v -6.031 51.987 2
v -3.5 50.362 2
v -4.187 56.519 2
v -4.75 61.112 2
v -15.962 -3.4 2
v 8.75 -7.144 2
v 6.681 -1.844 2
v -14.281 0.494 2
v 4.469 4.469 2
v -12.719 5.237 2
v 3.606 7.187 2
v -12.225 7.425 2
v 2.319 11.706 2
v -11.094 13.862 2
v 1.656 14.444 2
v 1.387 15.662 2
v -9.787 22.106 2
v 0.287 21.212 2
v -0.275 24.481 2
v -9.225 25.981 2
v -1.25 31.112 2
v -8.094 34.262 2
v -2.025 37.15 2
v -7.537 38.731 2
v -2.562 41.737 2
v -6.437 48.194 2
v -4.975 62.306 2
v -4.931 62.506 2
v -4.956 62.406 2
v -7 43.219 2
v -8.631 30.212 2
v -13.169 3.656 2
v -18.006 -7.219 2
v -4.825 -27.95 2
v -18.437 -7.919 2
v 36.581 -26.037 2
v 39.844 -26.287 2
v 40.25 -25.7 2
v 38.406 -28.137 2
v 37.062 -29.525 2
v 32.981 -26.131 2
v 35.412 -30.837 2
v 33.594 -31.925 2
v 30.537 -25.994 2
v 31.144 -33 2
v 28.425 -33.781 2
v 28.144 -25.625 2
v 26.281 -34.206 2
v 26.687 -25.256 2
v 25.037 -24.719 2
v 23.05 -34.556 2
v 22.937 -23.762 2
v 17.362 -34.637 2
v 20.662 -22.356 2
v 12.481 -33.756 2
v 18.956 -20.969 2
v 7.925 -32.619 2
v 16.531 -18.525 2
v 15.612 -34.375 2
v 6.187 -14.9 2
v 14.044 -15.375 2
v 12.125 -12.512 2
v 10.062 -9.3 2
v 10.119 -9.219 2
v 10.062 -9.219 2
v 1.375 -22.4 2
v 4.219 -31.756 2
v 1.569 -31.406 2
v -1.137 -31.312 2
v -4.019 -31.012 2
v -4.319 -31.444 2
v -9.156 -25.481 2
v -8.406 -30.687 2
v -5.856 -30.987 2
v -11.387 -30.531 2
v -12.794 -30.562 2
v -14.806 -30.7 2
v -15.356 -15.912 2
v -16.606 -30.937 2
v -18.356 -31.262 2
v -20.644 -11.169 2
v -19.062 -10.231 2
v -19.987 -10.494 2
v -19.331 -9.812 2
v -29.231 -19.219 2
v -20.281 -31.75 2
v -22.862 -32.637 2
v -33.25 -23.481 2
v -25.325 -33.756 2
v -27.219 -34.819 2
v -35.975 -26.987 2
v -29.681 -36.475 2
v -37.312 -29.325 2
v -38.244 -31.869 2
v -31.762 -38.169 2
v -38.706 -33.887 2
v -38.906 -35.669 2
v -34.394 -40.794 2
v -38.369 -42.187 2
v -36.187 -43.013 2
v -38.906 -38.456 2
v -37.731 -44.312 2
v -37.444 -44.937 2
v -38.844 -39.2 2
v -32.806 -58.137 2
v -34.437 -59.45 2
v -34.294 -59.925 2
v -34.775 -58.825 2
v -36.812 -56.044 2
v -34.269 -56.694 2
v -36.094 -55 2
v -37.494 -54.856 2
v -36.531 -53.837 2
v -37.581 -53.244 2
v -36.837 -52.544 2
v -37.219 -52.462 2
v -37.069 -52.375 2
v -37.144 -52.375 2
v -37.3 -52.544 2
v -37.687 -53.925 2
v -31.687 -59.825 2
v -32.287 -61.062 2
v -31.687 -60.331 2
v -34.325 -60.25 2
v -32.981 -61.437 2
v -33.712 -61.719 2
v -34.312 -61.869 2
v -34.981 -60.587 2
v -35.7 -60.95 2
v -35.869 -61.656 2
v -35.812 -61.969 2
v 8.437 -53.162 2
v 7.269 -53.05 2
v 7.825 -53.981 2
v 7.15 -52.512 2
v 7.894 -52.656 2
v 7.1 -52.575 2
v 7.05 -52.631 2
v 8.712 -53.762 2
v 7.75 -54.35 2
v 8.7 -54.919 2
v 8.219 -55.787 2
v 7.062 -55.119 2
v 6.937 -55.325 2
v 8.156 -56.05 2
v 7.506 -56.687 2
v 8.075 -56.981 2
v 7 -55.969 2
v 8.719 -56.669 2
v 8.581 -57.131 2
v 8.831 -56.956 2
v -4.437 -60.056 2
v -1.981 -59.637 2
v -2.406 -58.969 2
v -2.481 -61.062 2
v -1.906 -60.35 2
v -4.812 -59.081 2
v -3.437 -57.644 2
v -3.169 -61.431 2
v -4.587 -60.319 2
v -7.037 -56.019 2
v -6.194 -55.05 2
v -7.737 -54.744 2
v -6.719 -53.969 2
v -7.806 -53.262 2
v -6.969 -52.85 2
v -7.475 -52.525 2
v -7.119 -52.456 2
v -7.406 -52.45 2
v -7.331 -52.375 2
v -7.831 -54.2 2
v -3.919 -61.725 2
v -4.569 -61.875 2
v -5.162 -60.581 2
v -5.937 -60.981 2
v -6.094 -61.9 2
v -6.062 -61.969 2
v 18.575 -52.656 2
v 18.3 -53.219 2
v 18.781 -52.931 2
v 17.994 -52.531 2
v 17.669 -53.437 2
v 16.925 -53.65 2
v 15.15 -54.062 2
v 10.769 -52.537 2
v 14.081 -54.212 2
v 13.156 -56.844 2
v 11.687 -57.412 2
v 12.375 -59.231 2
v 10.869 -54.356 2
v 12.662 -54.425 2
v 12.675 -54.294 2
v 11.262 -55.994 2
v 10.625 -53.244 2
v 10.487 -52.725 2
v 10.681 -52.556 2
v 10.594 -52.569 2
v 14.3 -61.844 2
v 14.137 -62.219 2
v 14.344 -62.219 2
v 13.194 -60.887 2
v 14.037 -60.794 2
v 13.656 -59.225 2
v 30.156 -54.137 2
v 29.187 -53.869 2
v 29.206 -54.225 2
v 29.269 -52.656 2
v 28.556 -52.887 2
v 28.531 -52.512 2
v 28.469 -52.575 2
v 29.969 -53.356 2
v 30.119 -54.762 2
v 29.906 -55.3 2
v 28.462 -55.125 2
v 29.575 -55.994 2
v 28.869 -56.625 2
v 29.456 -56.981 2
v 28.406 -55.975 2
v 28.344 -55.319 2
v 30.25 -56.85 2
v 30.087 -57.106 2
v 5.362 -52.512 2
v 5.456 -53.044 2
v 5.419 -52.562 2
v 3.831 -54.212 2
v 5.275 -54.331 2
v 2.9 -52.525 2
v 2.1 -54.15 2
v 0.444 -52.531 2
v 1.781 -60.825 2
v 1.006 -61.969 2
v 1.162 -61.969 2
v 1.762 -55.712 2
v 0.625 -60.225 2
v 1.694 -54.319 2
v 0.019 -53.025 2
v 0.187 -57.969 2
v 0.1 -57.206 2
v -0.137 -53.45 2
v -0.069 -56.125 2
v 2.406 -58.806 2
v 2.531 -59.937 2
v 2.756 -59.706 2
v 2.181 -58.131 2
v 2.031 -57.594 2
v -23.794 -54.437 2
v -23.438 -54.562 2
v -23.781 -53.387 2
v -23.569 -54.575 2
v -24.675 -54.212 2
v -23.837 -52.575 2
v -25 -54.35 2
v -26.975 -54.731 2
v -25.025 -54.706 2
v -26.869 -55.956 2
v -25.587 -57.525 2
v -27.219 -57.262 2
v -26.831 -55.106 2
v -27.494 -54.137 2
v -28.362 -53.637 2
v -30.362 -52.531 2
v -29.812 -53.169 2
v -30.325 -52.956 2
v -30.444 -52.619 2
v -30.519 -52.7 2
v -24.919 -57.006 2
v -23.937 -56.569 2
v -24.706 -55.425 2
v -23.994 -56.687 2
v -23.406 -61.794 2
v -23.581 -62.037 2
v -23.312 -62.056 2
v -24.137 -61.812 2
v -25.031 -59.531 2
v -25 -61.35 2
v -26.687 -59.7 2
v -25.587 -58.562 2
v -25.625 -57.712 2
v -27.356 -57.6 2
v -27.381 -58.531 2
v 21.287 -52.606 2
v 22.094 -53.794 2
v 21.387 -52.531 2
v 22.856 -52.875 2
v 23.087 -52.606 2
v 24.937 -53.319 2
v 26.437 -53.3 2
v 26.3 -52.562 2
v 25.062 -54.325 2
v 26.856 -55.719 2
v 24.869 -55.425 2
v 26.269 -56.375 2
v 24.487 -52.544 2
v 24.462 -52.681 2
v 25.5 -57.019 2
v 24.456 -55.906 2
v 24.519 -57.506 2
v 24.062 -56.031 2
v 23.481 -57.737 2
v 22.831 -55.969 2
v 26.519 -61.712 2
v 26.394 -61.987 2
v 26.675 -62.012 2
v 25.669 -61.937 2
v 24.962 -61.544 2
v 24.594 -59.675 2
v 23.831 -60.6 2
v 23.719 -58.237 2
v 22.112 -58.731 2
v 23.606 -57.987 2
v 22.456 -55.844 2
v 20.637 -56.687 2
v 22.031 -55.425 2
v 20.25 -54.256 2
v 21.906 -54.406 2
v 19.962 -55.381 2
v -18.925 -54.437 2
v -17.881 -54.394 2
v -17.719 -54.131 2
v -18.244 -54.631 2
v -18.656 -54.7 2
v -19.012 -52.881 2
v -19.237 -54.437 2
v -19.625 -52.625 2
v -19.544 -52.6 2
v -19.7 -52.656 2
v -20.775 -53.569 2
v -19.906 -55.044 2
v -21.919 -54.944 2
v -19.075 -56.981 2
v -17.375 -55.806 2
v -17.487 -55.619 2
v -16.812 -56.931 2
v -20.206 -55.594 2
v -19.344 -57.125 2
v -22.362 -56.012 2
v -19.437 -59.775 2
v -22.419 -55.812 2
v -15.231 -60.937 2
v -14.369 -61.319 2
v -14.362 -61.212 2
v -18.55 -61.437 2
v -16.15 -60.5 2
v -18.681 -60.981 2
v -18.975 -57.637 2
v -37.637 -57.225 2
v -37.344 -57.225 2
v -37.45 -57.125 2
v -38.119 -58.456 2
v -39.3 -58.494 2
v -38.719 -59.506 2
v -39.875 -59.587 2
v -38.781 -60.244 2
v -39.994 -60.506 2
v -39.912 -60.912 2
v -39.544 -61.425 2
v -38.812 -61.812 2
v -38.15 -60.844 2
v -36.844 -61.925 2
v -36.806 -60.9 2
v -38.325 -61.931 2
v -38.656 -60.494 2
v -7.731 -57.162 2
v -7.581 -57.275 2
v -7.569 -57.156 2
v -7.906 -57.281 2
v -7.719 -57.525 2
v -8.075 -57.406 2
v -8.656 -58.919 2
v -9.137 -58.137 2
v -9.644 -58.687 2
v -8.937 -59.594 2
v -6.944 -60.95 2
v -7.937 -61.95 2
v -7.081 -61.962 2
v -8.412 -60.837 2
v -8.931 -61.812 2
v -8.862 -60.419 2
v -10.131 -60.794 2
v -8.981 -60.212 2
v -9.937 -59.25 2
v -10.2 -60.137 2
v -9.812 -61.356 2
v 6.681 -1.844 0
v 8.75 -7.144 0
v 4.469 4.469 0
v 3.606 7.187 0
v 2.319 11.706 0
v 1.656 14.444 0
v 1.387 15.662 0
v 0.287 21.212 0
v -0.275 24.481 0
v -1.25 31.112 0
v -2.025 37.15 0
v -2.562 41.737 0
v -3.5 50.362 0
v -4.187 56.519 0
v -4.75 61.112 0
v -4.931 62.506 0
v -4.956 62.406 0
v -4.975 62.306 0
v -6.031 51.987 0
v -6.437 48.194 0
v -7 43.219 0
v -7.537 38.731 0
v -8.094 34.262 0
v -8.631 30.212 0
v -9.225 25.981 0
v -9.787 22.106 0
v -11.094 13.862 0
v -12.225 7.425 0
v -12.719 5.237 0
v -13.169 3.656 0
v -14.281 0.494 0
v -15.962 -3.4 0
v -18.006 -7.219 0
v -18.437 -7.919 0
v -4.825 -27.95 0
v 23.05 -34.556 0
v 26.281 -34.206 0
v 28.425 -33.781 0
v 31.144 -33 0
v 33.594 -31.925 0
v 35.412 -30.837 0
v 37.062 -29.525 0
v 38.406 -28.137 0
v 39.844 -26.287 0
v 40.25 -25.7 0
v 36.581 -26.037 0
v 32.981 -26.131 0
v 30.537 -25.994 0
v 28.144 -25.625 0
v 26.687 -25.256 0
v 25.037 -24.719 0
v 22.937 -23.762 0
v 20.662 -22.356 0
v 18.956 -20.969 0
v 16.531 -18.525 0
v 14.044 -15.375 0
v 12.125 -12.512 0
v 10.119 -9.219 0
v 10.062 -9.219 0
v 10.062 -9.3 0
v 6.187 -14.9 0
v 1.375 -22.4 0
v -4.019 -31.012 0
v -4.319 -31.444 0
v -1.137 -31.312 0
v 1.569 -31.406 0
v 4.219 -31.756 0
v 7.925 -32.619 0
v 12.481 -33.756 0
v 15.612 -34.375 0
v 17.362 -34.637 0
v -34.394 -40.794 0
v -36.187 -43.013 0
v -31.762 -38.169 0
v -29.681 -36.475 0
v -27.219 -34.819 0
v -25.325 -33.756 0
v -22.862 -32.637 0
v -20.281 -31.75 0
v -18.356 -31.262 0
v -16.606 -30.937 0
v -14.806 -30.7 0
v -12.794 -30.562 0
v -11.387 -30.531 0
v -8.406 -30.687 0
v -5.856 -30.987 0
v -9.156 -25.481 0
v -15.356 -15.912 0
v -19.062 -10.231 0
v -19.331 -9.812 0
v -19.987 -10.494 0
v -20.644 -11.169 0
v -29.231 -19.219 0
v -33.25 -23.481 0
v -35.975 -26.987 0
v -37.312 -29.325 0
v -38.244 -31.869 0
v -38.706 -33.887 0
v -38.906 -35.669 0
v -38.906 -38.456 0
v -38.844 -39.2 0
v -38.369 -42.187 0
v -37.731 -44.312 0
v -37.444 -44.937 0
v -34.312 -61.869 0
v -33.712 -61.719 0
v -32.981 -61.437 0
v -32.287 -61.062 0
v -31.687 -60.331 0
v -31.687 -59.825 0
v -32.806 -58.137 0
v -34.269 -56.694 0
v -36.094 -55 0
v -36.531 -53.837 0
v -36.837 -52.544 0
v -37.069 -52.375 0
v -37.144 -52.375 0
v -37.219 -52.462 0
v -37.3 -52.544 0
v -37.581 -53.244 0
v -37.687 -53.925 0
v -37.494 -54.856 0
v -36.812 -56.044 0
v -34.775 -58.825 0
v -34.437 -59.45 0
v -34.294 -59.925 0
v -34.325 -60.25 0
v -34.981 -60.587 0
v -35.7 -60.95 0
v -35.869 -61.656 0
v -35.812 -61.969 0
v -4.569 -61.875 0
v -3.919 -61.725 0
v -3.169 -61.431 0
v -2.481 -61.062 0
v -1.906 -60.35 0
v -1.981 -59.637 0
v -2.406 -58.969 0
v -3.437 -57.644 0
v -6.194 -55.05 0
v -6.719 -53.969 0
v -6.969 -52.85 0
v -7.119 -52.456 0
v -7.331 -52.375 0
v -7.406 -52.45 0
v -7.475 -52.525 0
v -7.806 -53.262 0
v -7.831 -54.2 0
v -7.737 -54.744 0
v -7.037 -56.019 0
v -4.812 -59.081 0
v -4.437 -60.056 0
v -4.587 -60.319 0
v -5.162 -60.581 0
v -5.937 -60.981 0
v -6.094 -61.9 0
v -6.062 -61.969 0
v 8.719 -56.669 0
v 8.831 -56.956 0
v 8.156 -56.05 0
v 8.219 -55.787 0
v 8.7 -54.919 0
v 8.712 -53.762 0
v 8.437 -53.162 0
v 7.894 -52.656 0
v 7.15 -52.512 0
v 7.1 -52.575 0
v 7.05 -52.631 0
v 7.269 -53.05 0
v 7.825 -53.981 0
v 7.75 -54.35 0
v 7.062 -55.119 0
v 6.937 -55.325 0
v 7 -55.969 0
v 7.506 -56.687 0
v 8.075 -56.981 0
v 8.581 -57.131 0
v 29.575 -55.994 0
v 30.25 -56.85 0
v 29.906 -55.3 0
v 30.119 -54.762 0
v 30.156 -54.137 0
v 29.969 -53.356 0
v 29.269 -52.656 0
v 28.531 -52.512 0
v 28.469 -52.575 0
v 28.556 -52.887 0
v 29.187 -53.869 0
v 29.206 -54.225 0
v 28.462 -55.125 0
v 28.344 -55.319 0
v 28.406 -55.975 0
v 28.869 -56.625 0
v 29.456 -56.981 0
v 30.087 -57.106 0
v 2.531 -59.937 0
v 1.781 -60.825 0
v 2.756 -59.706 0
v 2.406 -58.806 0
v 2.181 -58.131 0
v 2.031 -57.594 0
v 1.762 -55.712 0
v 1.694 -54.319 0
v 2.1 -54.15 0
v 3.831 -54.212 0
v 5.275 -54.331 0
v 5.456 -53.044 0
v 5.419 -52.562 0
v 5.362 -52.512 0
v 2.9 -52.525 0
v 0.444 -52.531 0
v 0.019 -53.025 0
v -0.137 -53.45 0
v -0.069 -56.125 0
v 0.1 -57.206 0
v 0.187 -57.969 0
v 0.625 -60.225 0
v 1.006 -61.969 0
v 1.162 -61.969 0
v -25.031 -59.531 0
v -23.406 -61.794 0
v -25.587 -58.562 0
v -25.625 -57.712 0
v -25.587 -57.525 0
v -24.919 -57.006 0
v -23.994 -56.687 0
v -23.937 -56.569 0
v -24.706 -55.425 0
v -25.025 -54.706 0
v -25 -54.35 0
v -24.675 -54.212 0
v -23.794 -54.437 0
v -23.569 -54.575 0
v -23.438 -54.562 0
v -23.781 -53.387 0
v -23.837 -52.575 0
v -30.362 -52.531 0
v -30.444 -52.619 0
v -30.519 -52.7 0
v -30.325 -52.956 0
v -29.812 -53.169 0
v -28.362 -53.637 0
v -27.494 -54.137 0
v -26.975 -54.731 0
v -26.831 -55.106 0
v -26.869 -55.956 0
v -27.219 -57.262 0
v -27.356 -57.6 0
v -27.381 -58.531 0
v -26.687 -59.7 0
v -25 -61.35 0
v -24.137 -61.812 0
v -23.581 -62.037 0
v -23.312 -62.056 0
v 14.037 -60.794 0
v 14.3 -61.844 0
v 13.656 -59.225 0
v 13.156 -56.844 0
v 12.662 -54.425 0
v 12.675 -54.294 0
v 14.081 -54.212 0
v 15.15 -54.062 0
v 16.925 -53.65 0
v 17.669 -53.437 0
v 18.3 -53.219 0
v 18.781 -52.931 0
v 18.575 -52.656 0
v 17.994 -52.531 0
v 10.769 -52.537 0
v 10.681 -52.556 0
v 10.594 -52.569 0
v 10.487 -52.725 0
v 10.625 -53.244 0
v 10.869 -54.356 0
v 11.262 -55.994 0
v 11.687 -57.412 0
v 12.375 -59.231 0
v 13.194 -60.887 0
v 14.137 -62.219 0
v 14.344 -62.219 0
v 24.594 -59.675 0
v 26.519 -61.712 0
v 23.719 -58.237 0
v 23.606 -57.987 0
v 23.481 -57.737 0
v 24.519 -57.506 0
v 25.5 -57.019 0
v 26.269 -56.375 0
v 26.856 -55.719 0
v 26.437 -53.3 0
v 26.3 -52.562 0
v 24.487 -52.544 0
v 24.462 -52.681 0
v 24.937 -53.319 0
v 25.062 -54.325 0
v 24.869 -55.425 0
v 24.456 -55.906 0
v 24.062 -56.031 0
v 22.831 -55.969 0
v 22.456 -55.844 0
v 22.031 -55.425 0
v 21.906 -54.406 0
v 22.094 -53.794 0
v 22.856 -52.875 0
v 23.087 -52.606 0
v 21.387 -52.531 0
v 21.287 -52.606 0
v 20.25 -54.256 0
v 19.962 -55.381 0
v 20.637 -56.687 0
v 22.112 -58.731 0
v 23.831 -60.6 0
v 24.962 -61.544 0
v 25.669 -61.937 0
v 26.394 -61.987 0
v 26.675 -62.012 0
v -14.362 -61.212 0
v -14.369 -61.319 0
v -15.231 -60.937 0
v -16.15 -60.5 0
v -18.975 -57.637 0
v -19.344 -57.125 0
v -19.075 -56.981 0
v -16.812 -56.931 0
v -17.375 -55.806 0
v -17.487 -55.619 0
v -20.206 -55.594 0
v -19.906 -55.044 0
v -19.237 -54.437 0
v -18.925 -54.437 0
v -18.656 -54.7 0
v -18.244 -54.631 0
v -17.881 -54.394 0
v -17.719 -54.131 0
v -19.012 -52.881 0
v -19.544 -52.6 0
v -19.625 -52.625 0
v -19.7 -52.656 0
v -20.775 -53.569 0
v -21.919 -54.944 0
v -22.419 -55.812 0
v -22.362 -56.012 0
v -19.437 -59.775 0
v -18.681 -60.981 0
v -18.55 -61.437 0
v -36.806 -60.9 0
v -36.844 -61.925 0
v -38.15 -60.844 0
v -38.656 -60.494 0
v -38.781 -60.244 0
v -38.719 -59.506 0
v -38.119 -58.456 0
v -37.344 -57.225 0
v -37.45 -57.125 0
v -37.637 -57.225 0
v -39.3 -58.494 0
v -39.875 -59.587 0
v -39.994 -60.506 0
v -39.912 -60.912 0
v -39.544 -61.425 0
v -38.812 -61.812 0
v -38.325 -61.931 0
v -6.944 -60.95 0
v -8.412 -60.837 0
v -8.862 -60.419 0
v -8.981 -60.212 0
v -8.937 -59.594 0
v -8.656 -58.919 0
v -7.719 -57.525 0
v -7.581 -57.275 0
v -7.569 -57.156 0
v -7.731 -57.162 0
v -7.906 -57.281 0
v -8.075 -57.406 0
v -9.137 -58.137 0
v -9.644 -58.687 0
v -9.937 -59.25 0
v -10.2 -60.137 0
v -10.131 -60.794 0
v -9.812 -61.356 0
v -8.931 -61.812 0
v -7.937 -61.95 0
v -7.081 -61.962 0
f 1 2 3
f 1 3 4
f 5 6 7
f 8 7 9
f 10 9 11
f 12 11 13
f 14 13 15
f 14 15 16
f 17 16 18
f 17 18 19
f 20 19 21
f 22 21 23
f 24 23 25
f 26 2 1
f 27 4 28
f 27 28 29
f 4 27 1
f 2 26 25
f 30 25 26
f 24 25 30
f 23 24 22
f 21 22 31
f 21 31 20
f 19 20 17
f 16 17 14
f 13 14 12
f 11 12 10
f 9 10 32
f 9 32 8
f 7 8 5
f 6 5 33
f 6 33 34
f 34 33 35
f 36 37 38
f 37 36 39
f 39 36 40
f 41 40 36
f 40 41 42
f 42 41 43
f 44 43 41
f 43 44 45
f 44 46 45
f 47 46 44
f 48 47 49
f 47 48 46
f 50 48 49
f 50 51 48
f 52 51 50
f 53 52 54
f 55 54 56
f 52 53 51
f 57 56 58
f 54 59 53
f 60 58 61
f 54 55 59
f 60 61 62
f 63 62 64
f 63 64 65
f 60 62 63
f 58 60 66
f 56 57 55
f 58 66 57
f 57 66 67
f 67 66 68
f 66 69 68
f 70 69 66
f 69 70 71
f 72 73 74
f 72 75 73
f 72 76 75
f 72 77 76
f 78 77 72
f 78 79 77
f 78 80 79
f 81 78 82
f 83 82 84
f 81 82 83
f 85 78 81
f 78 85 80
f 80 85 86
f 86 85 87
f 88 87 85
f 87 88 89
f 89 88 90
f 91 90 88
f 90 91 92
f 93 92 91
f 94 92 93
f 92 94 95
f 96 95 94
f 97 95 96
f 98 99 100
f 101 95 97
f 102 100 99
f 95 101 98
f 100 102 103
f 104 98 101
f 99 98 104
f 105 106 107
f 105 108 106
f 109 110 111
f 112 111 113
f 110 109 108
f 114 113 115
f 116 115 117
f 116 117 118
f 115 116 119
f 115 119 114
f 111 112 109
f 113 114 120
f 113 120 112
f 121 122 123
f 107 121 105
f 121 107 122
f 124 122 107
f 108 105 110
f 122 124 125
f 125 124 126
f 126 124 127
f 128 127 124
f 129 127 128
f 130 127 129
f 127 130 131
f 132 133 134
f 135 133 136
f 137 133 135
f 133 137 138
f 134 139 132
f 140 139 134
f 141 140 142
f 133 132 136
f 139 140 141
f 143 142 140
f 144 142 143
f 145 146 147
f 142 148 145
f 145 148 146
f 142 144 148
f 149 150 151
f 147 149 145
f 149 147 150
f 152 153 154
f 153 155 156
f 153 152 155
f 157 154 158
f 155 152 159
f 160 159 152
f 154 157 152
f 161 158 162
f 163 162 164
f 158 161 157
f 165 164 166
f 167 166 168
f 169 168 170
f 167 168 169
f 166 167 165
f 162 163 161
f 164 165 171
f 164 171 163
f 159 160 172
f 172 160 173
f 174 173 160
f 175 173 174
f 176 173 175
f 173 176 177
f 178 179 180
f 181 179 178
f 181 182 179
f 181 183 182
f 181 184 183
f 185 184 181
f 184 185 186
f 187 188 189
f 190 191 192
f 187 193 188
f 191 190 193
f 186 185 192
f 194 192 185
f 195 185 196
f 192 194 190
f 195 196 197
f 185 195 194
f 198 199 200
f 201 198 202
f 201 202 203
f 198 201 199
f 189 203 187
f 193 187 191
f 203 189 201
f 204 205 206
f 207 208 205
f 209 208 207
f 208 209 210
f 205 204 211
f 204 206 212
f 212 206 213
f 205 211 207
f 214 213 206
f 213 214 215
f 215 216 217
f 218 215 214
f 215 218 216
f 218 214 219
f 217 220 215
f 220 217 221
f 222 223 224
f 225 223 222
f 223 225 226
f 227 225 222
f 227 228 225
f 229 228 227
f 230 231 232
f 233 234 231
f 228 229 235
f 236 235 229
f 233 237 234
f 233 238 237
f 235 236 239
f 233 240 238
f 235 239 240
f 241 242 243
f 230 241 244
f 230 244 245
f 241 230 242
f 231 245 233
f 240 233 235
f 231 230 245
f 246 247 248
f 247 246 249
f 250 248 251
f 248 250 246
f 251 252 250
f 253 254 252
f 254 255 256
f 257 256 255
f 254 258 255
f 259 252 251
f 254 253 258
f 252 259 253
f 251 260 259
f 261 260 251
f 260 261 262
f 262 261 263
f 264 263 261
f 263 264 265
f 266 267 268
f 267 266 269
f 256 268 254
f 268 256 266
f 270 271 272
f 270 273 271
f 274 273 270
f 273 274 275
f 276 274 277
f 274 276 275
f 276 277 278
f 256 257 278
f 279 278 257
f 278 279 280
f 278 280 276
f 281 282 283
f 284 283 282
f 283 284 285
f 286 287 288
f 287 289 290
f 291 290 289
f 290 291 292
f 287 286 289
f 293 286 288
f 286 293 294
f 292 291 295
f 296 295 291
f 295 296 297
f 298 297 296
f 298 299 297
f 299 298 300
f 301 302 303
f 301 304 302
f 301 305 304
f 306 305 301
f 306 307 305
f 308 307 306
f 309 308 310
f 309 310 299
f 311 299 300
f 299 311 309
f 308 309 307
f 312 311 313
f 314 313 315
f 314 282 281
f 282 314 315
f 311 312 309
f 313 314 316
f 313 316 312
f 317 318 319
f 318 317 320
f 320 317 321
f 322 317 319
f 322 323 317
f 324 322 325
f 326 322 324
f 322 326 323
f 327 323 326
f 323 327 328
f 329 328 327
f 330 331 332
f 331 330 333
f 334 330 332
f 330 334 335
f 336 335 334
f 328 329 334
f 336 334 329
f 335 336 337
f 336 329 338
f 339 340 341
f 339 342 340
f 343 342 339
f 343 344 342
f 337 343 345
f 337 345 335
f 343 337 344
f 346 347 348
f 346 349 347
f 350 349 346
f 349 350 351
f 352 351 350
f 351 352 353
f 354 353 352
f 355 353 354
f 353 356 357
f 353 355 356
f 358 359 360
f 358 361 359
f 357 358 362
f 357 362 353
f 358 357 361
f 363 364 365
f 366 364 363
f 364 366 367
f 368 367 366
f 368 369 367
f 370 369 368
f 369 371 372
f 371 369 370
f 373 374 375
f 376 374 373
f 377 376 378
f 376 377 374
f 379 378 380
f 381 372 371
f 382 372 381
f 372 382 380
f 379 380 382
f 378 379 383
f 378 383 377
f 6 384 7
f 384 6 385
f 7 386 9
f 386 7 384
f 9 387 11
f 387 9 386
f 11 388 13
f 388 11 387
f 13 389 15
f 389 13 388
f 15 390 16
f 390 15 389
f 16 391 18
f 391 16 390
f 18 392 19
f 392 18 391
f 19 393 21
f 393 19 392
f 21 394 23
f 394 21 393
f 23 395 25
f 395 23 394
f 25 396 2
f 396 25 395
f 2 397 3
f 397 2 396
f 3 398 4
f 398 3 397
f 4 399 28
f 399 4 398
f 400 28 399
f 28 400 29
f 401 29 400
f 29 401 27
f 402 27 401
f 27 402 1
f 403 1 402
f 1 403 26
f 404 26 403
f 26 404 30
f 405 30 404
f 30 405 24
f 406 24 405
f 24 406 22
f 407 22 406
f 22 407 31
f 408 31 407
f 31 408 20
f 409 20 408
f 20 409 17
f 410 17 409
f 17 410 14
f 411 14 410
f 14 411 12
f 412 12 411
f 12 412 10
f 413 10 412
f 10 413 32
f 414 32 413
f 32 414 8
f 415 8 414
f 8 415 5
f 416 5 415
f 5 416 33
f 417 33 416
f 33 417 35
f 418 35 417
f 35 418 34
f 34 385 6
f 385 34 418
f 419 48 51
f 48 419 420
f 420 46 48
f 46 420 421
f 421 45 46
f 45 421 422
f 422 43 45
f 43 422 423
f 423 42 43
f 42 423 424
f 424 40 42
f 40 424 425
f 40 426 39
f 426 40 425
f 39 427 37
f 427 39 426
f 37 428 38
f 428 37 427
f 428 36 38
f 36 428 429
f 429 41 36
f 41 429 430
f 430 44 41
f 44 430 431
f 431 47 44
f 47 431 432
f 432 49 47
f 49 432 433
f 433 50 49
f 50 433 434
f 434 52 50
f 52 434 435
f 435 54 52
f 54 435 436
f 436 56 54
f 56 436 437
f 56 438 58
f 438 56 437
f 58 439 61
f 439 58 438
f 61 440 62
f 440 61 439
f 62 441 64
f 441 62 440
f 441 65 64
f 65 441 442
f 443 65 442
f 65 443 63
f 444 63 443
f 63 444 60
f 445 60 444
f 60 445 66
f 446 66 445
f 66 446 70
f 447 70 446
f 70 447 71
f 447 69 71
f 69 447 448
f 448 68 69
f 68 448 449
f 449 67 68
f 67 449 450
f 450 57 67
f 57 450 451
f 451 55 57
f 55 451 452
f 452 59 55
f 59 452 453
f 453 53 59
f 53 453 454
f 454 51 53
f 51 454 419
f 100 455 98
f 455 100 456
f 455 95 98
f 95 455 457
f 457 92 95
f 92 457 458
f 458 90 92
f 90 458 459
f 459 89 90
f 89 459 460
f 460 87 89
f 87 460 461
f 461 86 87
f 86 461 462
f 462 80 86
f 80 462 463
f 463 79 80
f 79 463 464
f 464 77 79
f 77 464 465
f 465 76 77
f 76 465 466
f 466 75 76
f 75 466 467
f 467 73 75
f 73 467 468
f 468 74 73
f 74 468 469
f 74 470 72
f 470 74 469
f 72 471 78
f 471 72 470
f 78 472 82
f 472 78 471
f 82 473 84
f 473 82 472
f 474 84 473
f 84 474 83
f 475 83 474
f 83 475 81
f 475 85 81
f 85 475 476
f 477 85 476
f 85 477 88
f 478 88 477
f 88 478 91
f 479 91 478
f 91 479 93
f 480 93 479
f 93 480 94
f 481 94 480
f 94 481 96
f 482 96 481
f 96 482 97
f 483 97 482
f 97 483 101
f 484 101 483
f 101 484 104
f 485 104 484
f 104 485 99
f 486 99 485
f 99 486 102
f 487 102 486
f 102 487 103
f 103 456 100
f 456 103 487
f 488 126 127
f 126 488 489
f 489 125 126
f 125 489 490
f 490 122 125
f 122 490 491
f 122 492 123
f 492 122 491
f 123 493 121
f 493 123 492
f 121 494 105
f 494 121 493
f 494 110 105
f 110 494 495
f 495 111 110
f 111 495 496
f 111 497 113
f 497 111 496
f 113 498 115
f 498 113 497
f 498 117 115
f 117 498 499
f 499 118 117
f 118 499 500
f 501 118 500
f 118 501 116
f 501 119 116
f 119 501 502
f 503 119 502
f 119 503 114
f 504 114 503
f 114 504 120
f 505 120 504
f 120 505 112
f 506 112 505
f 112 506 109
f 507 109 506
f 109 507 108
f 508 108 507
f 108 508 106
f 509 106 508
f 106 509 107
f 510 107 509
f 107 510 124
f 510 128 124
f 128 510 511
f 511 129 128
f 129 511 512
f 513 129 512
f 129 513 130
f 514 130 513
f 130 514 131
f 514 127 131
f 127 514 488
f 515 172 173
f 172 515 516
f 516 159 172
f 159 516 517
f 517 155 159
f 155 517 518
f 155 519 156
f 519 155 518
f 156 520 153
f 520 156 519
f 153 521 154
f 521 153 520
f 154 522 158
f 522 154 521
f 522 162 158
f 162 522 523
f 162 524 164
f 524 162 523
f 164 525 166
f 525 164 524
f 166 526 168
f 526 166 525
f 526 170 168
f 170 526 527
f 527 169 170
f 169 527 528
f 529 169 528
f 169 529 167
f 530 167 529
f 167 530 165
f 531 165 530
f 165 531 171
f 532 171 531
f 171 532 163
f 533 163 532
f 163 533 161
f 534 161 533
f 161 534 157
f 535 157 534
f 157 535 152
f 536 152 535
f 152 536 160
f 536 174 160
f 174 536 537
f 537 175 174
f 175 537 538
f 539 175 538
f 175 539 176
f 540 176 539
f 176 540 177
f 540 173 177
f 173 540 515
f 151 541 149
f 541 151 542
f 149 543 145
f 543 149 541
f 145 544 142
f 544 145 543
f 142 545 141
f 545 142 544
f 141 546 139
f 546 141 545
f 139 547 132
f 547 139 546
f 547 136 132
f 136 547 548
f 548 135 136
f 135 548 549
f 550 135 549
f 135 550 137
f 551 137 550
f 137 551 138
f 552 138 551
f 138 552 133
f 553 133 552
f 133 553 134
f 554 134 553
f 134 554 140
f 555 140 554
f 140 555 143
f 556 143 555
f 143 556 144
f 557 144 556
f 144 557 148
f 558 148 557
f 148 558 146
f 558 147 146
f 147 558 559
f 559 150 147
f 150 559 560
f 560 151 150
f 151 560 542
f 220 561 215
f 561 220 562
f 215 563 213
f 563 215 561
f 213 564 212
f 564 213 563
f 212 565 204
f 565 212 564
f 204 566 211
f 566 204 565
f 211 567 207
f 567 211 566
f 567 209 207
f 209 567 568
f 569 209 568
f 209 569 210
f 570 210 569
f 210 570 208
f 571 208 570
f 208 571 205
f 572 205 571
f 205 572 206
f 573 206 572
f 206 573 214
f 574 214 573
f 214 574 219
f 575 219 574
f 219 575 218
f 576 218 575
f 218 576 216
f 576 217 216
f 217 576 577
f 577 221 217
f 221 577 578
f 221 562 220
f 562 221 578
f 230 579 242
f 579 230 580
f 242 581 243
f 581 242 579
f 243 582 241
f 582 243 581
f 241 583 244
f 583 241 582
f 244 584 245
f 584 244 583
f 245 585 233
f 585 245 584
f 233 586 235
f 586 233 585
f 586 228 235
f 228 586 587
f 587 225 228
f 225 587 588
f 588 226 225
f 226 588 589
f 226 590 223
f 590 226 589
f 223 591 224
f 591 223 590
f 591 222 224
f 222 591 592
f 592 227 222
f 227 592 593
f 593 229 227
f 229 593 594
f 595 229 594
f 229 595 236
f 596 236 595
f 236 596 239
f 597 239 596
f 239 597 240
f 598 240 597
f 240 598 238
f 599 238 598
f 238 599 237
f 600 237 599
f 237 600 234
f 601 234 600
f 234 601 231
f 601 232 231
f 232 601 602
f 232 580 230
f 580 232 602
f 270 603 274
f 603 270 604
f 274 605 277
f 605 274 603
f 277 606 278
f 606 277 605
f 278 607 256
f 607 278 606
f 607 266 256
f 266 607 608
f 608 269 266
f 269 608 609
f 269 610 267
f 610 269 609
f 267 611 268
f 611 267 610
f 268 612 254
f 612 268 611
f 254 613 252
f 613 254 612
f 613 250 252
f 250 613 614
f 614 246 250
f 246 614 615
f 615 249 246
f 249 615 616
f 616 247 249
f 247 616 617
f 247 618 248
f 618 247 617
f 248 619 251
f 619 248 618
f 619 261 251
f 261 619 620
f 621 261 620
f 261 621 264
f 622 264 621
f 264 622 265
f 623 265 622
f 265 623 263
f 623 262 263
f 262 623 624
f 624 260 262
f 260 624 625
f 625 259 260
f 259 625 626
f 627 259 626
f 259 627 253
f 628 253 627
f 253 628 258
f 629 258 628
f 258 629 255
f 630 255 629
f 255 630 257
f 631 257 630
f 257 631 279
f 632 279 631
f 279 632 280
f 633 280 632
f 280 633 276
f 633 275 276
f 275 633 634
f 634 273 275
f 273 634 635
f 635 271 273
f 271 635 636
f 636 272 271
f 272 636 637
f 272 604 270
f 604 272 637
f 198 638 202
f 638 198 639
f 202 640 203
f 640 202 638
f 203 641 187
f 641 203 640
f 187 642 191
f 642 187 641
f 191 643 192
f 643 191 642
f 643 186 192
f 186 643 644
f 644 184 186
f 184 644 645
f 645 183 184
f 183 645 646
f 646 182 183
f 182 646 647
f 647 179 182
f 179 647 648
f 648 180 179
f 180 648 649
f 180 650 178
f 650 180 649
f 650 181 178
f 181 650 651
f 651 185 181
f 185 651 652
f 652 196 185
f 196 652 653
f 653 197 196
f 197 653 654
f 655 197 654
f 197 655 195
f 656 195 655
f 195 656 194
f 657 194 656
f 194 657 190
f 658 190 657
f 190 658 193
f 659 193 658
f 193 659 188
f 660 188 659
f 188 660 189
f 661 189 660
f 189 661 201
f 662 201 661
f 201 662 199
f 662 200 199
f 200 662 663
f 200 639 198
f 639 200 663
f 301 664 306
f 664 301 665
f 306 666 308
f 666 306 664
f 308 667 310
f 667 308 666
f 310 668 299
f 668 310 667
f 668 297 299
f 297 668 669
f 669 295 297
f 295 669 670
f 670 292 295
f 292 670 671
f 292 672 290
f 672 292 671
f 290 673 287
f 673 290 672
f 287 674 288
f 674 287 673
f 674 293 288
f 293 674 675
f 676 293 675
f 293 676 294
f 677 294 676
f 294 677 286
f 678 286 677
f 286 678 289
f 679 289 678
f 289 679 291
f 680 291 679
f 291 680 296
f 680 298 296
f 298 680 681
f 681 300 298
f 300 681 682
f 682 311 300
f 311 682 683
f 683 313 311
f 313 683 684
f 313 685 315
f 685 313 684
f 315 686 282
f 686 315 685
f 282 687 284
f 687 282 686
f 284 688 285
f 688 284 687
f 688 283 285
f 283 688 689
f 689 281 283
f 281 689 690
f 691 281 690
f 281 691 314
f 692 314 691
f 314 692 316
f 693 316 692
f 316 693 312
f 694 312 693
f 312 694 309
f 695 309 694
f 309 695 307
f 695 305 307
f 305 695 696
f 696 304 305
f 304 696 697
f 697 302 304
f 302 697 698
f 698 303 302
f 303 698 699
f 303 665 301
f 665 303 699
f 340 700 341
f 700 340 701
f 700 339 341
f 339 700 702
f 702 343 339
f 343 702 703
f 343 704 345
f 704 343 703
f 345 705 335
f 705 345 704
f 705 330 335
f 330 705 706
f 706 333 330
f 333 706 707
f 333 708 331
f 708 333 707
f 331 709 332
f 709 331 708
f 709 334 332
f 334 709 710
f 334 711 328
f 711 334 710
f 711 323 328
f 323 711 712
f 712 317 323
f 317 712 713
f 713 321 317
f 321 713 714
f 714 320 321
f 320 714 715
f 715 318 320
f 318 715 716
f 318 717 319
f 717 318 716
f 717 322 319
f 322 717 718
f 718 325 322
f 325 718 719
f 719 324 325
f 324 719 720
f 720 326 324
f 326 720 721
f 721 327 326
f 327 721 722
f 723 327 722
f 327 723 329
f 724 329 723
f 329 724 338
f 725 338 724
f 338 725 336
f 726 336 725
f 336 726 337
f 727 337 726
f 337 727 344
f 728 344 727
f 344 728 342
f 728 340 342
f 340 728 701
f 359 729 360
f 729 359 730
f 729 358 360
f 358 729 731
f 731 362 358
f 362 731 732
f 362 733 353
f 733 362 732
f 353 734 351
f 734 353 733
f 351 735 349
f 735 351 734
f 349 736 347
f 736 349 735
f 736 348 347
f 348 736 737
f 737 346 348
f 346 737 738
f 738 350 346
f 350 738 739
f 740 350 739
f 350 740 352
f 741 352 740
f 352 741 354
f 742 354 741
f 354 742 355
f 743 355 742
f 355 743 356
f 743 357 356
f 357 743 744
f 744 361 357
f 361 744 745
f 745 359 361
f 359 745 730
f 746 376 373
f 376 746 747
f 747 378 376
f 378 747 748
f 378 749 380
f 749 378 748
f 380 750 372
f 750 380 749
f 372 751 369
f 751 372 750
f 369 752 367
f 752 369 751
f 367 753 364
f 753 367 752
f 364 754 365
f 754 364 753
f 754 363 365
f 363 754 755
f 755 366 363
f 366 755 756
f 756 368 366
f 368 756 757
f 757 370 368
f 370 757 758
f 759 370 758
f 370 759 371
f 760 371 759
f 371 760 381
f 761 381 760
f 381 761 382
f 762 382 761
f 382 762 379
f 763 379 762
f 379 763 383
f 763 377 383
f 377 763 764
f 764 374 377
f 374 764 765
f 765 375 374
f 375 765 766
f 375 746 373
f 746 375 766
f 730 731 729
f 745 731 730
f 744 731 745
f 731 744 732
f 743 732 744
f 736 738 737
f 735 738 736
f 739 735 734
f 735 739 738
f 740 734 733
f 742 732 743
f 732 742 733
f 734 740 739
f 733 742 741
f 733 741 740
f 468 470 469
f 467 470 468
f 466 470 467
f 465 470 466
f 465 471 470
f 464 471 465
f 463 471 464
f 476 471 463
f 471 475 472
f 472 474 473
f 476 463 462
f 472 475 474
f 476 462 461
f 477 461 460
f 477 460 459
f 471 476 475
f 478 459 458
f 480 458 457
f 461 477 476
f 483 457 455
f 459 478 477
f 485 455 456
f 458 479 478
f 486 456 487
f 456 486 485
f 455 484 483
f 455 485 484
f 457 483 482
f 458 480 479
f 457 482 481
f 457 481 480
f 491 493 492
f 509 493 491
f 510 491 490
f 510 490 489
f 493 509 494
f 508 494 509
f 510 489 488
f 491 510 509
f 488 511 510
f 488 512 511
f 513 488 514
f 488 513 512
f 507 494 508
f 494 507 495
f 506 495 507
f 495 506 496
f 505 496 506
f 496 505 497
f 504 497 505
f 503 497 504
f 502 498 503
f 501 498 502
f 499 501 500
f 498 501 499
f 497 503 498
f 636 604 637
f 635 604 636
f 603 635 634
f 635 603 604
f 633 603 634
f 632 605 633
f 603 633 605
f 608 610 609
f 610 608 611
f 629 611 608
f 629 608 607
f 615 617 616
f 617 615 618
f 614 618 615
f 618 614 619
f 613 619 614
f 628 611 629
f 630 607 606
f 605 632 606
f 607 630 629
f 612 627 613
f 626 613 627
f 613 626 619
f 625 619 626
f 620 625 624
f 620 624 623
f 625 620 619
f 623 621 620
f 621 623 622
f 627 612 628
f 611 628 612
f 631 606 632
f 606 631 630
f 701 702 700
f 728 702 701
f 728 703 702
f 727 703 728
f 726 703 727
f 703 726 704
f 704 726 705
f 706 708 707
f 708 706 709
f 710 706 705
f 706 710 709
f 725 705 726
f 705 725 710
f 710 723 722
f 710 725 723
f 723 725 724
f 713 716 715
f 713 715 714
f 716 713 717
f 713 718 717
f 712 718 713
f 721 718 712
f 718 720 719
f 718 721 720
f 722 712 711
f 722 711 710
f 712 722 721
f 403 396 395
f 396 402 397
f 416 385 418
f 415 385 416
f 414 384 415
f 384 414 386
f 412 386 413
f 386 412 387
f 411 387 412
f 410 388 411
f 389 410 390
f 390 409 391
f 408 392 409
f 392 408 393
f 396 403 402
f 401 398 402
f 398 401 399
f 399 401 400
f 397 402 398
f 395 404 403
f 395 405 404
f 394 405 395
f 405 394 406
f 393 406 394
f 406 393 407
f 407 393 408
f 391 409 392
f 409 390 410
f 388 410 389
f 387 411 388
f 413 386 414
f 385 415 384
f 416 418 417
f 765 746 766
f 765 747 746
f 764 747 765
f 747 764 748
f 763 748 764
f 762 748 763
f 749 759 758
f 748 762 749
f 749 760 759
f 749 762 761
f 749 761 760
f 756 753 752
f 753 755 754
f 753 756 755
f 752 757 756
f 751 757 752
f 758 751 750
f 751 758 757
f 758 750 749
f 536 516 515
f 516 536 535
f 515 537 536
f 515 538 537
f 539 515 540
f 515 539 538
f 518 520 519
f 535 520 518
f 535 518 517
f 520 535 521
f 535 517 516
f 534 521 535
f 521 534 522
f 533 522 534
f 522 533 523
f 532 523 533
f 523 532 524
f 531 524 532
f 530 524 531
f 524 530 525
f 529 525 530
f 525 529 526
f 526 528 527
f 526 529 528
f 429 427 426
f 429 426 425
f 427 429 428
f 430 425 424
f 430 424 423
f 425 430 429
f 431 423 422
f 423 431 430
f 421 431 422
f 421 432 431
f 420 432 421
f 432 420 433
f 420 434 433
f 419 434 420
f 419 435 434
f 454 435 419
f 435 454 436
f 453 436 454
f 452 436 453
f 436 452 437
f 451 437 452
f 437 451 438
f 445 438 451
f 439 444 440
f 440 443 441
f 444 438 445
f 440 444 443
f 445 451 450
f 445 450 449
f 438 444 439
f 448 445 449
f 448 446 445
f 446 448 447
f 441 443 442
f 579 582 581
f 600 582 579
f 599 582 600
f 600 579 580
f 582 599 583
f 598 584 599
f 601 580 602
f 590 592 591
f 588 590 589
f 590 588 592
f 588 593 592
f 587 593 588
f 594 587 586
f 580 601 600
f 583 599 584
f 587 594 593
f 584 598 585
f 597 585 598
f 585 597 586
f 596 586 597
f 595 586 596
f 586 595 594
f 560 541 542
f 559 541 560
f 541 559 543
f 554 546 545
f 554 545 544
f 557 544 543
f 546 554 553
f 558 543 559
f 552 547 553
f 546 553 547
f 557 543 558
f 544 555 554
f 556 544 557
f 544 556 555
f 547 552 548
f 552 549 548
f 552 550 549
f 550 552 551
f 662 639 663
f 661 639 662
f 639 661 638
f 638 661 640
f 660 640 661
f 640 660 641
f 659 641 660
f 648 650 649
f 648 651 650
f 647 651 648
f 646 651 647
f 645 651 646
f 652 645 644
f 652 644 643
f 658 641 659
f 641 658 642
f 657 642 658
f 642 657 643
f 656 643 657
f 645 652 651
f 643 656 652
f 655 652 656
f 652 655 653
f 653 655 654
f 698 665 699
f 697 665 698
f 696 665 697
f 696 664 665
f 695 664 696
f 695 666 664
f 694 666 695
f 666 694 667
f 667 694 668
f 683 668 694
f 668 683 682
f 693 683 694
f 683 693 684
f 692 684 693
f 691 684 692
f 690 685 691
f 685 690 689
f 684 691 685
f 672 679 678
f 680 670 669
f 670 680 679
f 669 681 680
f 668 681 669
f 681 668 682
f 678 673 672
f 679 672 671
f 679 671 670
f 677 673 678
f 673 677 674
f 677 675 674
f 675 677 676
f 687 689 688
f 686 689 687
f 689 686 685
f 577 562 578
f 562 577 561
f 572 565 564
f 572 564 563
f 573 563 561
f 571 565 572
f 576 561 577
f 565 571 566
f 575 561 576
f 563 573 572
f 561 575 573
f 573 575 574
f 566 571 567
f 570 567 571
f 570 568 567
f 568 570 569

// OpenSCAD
module d3d1663a027828c617518f4e269a5e8a_1()
{
 /* Generated by trace2scad version 20150415
    http://aggregate.org/MAKE/TRACE2SCAD/
    Optimized model has 387/4796 original points
 */
 color([0.48, 0.48, 0.48])
 assign(minx=0) /* polygon minx=39 */
 assign(miny=0) /* polygon miny=45 */
 assign(maxx=12880) /* polygon maxx=12880 */
 assign(maxy=20000) /* polygon maxy=20001 */
 assign(dx=maxx-minx)
 assign(dy=maxy-miny)
 assign(maxd=((dx>dy)?dx:dy))
 scale([1/maxd, 1/maxd, 1])
 translate([-minx-dx/2, -miny-dy/2, 0])
 linear_extrude(height=1, convexity=387)
 union() {
  union() {
   polygon([[5647,19985],[5644,19969],[5475,18318],[5410,17711],[5320,16915],[5234,16197],[5145,15482],[5059,14834],[4964,14157],[4874,13537],[4665,12218],[4484,11188],[4405,10838],[4333,10585],[4155,10079],[3886,9456],[3559,8845],[3490,8733],[5668,5528],[7840,8857],[7509,9705],[7155,10715],[7017,11150],[6811,11873],[6705,12311],[6662,12506],[6486,13394],[6396,13917],[6240,14978],[6116,15944],[6030,16678],[5880,18058],[5770,19043],[5680,19778],[5651,20001]], convexity=6);
   polygon([[8050,8518],[8050,8512],[7430,7616],[6660,6416],[5797,5038],[5749,4969],[6258,4990],[6691,4975],[7115,4919],[7708,4781],[8437,4599],[8938,4500],[9218,4458],[10128,4471],[10645,4527],[10988,4595],[11423,4720],[11815,4892],[12106,5066],[12370,5276],[12585,5498],[12815,5794],[12880,5888],[12293,5834],[11717,5819],[11326,5841],[10943,5900],[10710,5959],[10446,6045],[10110,6198],[9746,6423],[9473,6645],[9085,7036],[8687,7540],[8380,7998],[8059,8525],[8050,8525]], convexity=9);
   polygon([[3242,8321],[3137,8213],[1763,6925],[1120,6243],[684,5682],[470,5308],[321,4901],[247,4578],[215,4293],[215,3847],[225,3728],[301,3250],[403,2910],[449,2810],[650,3118],[937,3473],[1358,3893],[1691,4164],[2085,4429],[2388,4599],[2782,4778],[3195,4920],[3503,4998],[3783,5050],[4071,5088],[4393,5110],[4618,5115],[5095,5090],[5503,5042],[4975,5923],[3983,7454],[3390,8363],[3347,8430]], convexity=7);
   polygon([[485,1606],[472,1593],[427,1481],[410,1372],[441,1223],[550,1033],[876,588],[930,488],[953,412],[948,360],[843,306],[728,248],[701,135],[710,85],[950,101],[1046,125],[1163,170],[1274,230],[1370,347],[1370,428],[1191,698],[957,929],[665,1200],[595,1386],[546,1593],[509,1620],[497,1620]], convexity=8);
   polygon([[5255,1608],[5244,1596],[5191,1478],[5187,1328],[5202,1241],[5314,1037],[5670,547],[5730,391],[5706,349],[5614,307],[5490,243],[5465,96],[5470,85],[5709,100],[5813,124],[5933,171],[6043,230],[6135,344],[6123,458],[6055,565],[5890,777],[5449,1192],[5365,1365],[5325,1544],[5301,1607],[5267,1620]], convexity=8);
   polygon([[6904,1596],[6511,1595],[6443,1516],[6418,1448],[6429,1020],[6456,847],[6470,725],[6540,364],[6601,85],[6626,85],[6725,268],[6845,410],[6881,447],[6825,591],[6789,699],[6765,785],[6722,1086],[6711,1309],[6776,1336],[7053,1326],[7284,1307],[7313,1513],[7307,1590],[7298,1598]], convexity=10);
   polygon([[7576,1588],[7568,1579],[7603,1512],[7692,1363],[7680,1304],[7570,1181],[7550,1148],[7560,1045],[7641,930],[7732,883],[7813,859],[7853,887],[7835,933],[7745,1032],[7755,1074],[7832,1213],[7834,1398],[7790,1494],[7703,1575],[7584,1598]], convexity=10);
   polygon([[11000,1593],[10995,1588],[11009,1538],[11110,1381],[11113,1324],[10994,1180],[10975,1149],[10985,1044],[11059,940],[11153,883],[11254,863],[11280,904],[11172,1041],[11225,1152],[11259,1238],[11265,1338],[11235,1463],[11123,1575],[11005,1598]], convexity=10);
   polygon([[1569,1581],[1557,1568],[1588,1527],[1670,1493],[1902,1418],[2041,1338],[2124,1243],[2147,1183],[2141,1047],[2085,838],[2063,784],[2059,635],[2170,448],[2440,184],[2578,110],[2667,74],[2710,71],[2695,113],[2435,475],[2346,630],[2340,766],[2346,796],[2453,879],[2601,930],[2610,949],[2487,1132],[2436,1247],[2440,1304],[2492,1326],[2633,1290],[2669,1268],[2690,1270],[2635,1458],[2626,1588],[1582,1595]], convexity=13);
   polygon([[8149,1591],[8135,1589],[8118,1564],[8140,1481],[8179,1303],[8242,1041],[8310,814],[8420,523],[8551,258],[8702,45],[8735,45],[8728,105],[8686,273],[8625,524],[8545,905],[8466,1292],[8468,1313],[8693,1326],[8864,1350],[9148,1416],[9267,1450],[9368,1485],[9445,1531],[9412,1575],[9319,1595],[8163,1594]], convexity=9);
   polygon([[9854,1589],[9846,1583],[9680,1319],[9634,1139],[9742,930],[9978,603],[10253,304],[10434,153],[10547,90],[10663,82],[10708,78],[10683,126],[10375,452],[10235,682],[10217,722],[10197,762],[10363,799],[10520,877],[10643,980],[10737,1085],[10670,1472],[10648,1590],[10358,1593],[10354,1571],[10430,1469],[10450,1308],[10419,1132],[10353,1055],[10290,1035],[10093,1045],[10033,1065],[9965,1132],[9945,1295],[9975,1393],[10097,1540],[10134,1583],[9862,1595]], convexity=13);
   polygon([[3300,1580],[3288,1575],[3116,1429],[2933,1209],[2853,1070],[2862,1038],[3330,436],[3451,243],[3472,170],[4141,189],[4142,206],[4003,250],[3856,320],[3404,778],[3345,860],[3388,883],[3750,891],[3660,1071],[3642,1101],[3207,1105],[3255,1193],[3362,1290],[3412,1290],[3455,1248],[3521,1259],[3579,1297],[3605,1339],[3398,1539],[3313,1584]], convexity=12);
   polygon([[433,852],[418,844],[152,641],[60,466],[41,319],[54,254],[113,172],[230,110],[308,91],[545,92],[551,256],[336,265],[255,321],[235,361],[245,479],[341,647],[465,844],[448,860]], convexity=8);
   polygon([[5175,835],[5148,815],[4978,698],[4897,610],[4850,520],[4808,378],[4819,273],[4870,183],[5011,110],[5170,88],[5307,86],[5329,248],[5094,266],[5022,333],[5003,366],[5010,465],[5055,573],[5205,796],[5227,836],[5229,855],[5203,854]], convexity=8);
  }
 }
}

module d3d1663a027828c617518f4e269a5e8a()
{
 /* all layers combined, scaled to within a 1mm cube */
 scale([1, 1, 1/1])
 difference() {
  union() {
   scale([1,1,2]) translate([0,0,-0.5]) d3d1663a027828c617518f4e269a5e8a_1();
  }
  translate([0,0,-2]) cube([2,2,4],center=true);
 }
}

scale([125, 125, 2]) {
	d3d1663a027828c617518f4e269a5e8a();
}
